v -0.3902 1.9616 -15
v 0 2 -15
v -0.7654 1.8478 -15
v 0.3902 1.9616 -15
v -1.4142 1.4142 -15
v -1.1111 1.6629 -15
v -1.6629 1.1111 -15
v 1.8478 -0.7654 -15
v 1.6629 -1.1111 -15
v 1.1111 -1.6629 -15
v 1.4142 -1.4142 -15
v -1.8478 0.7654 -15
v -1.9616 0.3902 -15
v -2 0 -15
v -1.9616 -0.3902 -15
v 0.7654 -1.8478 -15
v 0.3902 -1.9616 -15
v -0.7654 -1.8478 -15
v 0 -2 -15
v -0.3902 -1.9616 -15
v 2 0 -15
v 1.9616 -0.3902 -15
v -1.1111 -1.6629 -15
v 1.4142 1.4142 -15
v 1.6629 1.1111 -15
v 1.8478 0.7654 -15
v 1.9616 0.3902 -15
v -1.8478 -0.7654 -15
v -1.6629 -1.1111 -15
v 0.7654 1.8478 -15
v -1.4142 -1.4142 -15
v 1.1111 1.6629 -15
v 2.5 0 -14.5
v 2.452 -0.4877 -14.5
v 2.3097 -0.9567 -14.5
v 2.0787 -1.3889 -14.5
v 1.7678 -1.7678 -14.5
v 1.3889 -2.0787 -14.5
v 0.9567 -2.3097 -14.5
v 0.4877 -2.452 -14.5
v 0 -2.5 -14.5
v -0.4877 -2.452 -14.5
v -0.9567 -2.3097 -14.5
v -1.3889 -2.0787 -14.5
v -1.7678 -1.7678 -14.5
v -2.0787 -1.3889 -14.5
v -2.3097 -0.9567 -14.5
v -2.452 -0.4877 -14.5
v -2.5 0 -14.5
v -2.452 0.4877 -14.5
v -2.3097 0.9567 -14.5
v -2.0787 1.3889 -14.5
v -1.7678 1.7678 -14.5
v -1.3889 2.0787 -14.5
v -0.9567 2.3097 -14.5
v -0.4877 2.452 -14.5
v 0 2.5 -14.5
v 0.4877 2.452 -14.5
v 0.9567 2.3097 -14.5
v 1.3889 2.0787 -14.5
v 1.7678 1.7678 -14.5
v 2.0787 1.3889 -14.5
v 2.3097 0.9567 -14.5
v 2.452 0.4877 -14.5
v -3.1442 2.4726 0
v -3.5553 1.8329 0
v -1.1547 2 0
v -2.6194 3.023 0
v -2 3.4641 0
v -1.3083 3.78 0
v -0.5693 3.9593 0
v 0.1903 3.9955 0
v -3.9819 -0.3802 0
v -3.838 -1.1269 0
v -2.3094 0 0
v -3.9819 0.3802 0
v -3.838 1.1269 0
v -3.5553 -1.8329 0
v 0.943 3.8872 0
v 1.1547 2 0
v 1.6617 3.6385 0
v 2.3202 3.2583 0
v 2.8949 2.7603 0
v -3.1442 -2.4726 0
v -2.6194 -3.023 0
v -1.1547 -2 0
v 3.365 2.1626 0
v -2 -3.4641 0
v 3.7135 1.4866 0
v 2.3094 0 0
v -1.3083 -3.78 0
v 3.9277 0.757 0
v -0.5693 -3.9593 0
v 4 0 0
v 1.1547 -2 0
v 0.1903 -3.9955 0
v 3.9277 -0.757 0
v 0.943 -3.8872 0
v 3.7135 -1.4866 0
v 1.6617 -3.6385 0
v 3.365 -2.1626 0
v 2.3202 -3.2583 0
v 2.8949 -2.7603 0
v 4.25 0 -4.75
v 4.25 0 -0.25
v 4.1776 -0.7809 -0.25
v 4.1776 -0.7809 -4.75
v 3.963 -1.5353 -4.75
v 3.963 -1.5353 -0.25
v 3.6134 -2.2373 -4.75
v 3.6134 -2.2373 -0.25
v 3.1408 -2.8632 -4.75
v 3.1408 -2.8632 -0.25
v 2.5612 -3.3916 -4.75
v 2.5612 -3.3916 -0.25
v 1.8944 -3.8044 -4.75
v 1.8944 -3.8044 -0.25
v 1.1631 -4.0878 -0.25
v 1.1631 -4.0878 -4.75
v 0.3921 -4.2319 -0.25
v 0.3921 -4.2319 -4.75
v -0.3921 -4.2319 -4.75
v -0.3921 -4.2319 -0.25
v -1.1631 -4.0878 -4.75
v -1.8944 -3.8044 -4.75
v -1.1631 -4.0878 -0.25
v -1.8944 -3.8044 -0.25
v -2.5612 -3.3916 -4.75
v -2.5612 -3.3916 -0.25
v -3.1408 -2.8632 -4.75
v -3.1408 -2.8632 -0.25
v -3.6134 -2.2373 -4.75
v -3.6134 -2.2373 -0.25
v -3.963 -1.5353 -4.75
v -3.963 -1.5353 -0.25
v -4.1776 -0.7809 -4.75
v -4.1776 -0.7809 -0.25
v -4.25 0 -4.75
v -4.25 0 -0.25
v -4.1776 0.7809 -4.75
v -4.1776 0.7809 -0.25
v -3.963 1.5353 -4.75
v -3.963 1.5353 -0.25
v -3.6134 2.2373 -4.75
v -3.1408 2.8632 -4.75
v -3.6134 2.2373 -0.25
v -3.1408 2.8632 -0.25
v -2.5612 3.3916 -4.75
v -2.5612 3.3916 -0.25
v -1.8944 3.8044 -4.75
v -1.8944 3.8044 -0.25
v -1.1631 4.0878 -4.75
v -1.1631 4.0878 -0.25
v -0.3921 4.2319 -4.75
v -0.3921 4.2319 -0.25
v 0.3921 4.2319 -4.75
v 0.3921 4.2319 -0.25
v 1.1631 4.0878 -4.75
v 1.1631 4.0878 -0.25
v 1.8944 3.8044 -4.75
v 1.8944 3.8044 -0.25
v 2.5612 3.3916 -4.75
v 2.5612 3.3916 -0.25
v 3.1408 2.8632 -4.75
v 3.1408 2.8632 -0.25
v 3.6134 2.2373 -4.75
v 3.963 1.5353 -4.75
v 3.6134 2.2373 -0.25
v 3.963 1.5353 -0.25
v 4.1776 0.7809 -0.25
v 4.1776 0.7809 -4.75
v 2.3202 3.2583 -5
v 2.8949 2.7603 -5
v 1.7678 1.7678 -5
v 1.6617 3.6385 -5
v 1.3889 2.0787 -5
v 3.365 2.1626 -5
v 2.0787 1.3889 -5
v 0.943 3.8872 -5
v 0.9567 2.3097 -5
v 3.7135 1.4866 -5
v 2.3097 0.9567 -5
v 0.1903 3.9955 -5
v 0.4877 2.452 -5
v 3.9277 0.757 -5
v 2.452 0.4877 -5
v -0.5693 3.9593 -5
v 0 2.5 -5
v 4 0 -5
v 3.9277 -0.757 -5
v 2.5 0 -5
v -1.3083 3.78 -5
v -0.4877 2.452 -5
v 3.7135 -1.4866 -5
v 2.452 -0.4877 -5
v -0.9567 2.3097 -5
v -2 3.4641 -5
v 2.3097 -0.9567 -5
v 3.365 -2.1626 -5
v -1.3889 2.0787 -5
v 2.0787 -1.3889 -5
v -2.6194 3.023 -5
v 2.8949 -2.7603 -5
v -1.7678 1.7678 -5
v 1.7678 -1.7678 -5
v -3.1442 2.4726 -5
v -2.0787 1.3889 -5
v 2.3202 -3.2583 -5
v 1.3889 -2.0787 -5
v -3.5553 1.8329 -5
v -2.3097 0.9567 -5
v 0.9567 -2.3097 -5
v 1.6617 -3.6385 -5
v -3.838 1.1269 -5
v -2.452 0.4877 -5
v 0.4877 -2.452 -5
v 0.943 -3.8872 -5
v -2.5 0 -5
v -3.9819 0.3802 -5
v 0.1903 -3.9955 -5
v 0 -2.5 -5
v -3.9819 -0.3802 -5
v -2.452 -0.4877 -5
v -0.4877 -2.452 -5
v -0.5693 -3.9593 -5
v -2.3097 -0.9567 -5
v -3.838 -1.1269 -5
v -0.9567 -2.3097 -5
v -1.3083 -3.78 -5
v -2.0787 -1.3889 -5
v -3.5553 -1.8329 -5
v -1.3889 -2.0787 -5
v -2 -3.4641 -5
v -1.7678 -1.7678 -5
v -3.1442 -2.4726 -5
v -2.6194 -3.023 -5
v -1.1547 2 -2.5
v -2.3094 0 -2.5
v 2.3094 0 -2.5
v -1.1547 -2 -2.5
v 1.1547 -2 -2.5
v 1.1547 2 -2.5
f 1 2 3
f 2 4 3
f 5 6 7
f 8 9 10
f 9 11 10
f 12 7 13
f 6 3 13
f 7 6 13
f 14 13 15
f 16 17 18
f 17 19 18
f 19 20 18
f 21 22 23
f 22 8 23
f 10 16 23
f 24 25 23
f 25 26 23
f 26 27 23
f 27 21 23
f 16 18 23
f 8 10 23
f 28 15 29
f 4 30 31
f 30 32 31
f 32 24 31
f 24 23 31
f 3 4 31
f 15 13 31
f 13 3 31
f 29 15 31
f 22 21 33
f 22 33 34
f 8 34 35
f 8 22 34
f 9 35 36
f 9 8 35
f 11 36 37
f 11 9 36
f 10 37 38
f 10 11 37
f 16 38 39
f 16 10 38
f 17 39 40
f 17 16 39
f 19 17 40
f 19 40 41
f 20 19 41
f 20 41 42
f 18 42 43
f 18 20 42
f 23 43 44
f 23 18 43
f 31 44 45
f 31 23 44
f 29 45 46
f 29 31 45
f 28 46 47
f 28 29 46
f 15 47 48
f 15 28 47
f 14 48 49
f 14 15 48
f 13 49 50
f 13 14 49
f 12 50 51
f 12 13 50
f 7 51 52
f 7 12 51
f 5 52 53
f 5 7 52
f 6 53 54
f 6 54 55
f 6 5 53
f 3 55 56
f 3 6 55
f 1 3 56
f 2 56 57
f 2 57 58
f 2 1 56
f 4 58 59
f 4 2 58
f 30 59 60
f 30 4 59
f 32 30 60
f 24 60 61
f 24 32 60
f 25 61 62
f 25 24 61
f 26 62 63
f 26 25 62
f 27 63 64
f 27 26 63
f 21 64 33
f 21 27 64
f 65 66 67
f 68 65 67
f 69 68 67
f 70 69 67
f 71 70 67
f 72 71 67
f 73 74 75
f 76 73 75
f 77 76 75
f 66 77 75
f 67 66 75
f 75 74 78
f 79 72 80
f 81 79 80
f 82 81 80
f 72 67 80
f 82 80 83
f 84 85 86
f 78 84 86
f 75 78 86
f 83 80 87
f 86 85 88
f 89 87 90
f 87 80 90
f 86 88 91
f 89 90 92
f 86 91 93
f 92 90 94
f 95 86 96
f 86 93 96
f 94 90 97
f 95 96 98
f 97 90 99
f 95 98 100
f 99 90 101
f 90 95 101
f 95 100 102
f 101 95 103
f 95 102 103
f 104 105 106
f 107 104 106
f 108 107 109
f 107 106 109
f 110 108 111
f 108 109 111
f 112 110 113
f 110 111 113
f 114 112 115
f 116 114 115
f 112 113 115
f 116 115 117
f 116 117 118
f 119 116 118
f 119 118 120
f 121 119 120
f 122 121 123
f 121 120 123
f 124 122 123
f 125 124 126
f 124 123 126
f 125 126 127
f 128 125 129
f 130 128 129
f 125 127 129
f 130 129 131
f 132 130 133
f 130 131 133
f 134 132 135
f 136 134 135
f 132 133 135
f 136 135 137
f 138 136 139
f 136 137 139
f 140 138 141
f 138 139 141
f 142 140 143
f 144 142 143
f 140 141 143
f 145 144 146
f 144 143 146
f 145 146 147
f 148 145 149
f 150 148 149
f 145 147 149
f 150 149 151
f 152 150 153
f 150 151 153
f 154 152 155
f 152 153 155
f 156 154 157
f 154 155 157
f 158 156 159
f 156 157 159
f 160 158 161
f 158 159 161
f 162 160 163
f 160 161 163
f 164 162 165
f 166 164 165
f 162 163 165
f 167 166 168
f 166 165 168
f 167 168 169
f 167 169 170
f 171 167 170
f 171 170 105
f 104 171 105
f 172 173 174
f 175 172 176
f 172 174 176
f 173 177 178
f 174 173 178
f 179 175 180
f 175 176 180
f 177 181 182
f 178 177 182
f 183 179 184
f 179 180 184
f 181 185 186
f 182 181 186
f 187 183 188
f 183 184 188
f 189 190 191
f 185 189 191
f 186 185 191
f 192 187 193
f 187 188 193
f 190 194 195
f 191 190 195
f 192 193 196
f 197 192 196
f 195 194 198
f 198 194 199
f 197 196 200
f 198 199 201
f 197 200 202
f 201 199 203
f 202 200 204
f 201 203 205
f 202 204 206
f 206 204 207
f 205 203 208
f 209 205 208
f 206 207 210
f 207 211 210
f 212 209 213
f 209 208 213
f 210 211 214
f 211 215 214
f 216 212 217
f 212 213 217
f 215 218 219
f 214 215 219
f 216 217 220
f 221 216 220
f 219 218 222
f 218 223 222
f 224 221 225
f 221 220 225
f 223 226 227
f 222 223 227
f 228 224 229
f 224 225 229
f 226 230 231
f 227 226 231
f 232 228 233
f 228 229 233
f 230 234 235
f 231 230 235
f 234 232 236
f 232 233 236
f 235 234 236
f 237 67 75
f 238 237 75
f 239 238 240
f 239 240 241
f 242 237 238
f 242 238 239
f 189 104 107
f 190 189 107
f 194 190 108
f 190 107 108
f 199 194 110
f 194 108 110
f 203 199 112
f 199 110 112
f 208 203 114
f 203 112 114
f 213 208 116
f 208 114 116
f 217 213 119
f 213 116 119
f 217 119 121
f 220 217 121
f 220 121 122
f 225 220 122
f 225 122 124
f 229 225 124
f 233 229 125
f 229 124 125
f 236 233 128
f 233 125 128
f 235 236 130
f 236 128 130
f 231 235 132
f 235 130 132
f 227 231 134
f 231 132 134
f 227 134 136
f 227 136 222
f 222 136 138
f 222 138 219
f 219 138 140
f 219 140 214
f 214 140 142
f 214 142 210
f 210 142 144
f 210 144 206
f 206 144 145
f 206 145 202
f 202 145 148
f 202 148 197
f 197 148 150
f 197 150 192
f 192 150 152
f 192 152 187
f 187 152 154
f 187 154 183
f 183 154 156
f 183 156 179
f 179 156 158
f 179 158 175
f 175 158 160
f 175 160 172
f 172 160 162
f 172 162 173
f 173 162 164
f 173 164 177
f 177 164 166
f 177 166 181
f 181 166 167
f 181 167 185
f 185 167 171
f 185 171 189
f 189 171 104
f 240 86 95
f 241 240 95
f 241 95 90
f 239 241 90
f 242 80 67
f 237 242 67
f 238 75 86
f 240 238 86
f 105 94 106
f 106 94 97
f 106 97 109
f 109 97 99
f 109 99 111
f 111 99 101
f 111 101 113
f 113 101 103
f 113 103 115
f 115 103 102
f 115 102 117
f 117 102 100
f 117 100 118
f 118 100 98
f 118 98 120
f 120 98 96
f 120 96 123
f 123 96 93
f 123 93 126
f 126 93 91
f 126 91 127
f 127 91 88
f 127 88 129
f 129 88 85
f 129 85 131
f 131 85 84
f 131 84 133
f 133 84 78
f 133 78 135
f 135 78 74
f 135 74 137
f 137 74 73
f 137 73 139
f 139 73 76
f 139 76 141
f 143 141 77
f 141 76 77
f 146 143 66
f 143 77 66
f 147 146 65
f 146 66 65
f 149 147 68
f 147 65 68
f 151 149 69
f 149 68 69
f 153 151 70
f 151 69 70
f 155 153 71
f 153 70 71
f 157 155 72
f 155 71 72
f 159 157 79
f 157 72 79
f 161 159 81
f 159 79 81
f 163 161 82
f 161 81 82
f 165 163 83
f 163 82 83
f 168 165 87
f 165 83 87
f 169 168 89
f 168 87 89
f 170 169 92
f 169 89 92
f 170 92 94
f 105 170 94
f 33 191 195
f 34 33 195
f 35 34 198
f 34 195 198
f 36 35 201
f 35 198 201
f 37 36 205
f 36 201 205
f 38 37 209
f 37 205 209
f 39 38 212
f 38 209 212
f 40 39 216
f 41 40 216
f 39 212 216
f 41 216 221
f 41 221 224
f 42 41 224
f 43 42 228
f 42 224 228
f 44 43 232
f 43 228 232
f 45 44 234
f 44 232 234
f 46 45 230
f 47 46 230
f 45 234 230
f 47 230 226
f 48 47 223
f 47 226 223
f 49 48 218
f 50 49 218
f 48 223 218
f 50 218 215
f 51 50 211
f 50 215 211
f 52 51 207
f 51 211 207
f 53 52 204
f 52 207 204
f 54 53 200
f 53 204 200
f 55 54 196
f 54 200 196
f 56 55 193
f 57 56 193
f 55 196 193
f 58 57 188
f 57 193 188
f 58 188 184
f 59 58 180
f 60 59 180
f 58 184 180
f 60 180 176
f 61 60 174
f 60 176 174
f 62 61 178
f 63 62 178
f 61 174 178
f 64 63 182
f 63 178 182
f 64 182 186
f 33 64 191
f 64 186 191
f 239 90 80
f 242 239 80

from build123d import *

# Parameters (mm, degrees)
F3_DEPTH = 2.5
F4_SIZE  = 0.5
F5_SIZE  = 0.25


with BuildPart() as f1:
    # F0 (on Front) → F1 (revolve)
    with BuildSketch(Plane.XZ):
        Polygon((4.25, 0), (0, 0), (0, -15), (2.5, -15), (2.5, -5), (4.25, -5), align=None)
    revolve(axis=Axis((0, 0, -7.5), (0, 0, -1)))

    # F2 (on face) → F3 (cut)
    with BuildSketch(Plane.XY):
        Polygon((1.154701, 2), (-1.154701, 2), (-2.309401, 0), (-1.154701, -2), (1.154701, -2), (2.309401, 0), align=None)
    extrude(amount=-F3_DEPTH, mode=Mode.SUBTRACT)

    # F4
    f4_edges = [f1.edges().sort_by_distance(p)[0] for p in [
        (-2.5, 0, -15),
    ]]
    chamfer(f4_edges, length=F4_SIZE)

    # F5
    f5_edges = [f1.edges().sort_by_distance(p)[0] for p in [
        (-4.25, 0, 0),
        (-4.25, 0, -5),
    ]]
    chamfer(f5_edges, length=F5_SIZE)


solid = f1.part
